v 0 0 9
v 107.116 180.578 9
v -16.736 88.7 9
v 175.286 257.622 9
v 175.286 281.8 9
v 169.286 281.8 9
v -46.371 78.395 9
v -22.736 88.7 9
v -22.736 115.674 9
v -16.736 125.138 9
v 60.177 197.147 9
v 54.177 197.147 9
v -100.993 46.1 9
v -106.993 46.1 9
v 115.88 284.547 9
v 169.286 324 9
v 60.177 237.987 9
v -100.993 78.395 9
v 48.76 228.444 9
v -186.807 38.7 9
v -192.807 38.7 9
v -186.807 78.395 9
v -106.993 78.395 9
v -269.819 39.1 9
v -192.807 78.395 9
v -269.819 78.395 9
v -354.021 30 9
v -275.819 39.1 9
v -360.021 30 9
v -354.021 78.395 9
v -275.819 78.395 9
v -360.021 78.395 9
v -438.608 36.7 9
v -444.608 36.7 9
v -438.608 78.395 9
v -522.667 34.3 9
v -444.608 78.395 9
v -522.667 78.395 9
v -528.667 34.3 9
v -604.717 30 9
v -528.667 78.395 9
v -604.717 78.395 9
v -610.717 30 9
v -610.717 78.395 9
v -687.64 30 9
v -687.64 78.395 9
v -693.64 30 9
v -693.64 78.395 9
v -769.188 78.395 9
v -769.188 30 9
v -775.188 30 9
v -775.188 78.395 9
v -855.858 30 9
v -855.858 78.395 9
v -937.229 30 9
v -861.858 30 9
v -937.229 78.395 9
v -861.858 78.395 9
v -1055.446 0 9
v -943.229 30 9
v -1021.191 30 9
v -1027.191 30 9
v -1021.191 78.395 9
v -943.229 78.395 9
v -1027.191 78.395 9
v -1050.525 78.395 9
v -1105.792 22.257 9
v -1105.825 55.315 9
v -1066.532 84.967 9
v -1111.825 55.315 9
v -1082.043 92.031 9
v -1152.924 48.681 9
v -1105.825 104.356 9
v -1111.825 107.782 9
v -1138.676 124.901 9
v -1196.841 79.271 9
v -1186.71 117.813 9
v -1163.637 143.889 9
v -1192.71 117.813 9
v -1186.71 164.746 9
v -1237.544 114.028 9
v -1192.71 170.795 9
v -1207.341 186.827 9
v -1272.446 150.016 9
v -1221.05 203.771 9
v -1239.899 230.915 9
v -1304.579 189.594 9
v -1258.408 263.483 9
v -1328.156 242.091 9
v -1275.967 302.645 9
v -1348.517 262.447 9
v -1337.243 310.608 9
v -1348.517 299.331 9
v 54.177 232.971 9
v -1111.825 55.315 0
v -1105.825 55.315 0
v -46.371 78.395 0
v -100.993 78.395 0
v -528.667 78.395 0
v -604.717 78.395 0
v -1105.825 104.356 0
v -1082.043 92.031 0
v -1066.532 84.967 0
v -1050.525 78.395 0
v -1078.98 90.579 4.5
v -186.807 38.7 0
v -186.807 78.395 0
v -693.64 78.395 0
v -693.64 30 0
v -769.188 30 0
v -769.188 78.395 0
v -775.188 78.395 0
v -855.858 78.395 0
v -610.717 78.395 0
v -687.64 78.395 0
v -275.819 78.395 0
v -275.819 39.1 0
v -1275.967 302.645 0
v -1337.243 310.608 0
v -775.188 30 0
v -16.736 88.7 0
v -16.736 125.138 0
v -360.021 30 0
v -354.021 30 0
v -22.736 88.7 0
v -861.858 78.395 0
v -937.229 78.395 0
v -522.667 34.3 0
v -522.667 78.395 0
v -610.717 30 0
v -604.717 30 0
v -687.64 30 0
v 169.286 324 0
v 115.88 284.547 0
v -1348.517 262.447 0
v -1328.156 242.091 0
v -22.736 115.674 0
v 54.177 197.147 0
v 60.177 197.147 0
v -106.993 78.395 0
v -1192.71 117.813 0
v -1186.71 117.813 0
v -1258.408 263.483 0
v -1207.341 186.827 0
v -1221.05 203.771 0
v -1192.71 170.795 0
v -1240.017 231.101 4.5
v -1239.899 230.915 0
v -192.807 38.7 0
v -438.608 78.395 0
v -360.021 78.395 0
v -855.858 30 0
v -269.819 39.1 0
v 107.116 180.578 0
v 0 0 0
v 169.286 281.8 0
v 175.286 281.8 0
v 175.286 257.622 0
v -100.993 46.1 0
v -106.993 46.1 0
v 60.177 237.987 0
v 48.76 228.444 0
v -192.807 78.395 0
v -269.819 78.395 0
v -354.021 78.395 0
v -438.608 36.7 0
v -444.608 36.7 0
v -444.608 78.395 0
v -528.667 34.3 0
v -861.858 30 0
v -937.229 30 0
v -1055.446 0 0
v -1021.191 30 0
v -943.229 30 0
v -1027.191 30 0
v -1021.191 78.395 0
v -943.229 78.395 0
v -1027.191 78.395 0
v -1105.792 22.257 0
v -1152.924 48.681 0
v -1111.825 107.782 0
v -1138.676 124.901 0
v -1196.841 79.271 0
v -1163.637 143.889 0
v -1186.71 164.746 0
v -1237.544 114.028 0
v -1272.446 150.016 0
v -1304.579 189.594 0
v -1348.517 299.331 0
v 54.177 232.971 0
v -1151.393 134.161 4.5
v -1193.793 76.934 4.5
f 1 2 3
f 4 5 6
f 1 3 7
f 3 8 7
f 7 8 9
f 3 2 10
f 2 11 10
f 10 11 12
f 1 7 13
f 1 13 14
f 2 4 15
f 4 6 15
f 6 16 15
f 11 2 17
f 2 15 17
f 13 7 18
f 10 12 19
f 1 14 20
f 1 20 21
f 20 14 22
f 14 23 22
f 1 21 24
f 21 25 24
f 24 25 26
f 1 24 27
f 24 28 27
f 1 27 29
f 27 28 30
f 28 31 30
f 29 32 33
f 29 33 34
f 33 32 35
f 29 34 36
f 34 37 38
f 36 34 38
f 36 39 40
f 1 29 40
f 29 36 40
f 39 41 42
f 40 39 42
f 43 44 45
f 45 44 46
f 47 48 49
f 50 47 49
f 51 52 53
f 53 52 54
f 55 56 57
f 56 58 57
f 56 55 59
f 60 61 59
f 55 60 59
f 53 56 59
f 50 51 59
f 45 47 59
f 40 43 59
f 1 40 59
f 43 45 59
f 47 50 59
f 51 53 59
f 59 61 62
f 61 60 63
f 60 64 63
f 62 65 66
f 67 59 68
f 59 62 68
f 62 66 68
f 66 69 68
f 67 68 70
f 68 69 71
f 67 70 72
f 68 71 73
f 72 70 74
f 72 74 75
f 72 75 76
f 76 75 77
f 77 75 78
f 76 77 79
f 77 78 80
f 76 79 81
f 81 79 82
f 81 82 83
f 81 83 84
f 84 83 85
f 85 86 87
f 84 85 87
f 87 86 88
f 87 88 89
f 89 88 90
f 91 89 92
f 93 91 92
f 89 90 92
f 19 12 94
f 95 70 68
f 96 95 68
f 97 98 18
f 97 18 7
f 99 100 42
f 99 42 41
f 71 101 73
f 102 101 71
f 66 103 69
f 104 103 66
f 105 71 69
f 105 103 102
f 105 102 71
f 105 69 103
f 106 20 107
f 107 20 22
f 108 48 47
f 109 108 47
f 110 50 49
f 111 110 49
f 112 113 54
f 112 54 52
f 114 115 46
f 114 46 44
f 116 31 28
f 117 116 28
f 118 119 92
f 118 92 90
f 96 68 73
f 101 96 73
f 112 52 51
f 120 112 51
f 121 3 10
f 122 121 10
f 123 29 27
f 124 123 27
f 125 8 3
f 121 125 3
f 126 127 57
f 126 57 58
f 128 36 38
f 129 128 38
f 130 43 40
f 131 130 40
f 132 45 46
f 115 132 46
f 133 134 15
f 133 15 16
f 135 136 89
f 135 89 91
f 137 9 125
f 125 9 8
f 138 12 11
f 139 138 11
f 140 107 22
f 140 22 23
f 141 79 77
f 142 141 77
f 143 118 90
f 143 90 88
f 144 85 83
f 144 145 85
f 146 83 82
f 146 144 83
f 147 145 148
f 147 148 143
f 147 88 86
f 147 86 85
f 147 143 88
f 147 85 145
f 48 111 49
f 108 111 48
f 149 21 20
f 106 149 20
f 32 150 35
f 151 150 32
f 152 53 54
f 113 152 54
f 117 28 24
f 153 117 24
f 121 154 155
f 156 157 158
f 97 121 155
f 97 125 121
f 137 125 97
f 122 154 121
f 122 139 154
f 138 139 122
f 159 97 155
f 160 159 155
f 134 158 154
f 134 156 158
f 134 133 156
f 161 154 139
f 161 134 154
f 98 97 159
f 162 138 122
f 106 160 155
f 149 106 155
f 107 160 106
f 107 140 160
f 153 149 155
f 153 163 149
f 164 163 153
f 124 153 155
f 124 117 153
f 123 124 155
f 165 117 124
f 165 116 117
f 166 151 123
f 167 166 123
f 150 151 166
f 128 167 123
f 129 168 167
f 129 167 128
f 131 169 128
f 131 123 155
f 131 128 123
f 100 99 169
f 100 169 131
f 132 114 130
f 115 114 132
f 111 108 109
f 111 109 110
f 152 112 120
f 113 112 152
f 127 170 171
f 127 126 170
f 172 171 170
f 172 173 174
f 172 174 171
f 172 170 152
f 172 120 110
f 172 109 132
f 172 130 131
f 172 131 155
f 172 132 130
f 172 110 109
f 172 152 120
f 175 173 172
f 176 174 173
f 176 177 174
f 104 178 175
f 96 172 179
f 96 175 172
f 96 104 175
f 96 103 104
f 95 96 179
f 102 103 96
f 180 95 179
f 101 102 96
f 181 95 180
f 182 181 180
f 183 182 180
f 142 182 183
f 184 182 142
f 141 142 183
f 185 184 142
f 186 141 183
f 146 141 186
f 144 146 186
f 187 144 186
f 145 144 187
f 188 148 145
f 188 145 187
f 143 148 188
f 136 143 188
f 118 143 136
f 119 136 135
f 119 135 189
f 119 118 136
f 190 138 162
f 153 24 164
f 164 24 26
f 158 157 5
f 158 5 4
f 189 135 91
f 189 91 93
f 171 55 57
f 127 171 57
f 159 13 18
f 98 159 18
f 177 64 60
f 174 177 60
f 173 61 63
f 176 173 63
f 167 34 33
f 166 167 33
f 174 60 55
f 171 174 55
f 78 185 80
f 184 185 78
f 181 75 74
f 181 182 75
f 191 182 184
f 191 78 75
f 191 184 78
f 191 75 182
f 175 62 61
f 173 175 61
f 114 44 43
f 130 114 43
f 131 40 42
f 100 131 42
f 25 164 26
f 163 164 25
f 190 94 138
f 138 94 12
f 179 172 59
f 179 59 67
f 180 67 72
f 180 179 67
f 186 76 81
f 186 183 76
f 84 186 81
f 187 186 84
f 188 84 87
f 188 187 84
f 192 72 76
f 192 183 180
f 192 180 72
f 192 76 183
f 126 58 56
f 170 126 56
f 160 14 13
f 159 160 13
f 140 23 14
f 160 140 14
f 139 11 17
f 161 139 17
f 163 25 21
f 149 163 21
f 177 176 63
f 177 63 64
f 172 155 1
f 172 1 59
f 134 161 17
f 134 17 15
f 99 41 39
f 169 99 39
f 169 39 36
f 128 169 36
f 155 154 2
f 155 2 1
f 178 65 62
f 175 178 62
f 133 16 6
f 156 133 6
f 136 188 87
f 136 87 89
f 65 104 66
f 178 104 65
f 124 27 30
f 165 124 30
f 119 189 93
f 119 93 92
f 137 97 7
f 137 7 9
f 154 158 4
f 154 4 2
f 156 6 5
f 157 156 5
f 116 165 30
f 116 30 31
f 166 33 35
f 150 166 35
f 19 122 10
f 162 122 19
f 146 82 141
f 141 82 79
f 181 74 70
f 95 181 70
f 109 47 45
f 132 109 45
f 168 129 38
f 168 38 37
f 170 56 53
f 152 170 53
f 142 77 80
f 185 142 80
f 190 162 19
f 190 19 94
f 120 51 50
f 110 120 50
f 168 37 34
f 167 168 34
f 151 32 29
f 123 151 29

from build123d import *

# Parameters (mm, degrees)
BOSS_EXTRU_2_DEPTH      = 9
ENL_V_MAT_EXTRU_2_DEPTH = 9
ENL_V_MAT_EXTRU_3_DEPTH = 10


with BuildPart() as part:
    # Esquisse2 → Boss.-Extru.2 (new body)
    with BuildSketch(Plane.XY):
        with BuildLine():
            Line((0, 0), (-1055.446290734, 0))
            add(Edge.make_bspline(
                [(-1055.446290734, 0), (-1207.572733387, 59.072106031), (-1304.579199027, 189.593529265)],
                knots=[0, 0, 0, 1, 1, 1], degree=2))
            Line((-1304.579199027, 189.593529265), (-1328.155601237, 242.090877604))
            Line((-1328.155601237, 242.090877604), (-1348.517039509, 262.446992266))
            Line((-1348.517039509, 262.446992266), (-1348.517039509, 299.331021292))
            Line((-1348.517039509, 299.331021292), (-1337.24264668, 310.608362644))
            Line((-1337.24264668, 310.608362644), (-1275.966827179, 302.644588826))
            add(Edge.make_bspline(
                [(-1275.966827179, 302.644588826), (-1212.760641583, 141.531535954), (-1050.525159664, 78.394553502)],
                knots=[0, 0, 0, 1, 1, 1], degree=2))
            Line((-1050.525159664, 78.394553502), (-46.371074076, 78.394553502))
            Line((-46.371074076, 78.394553502), (48.76008987, 228.44376205))
            Line((48.76008987, 228.44376205), (115.880348206, 284.547364773))
            Line((115.880348206, 284.547364773), (175.286334456, 328.432610938))
            Line((175.286334456, 328.432610938), (175.286334456, 257.621549377))
            Line((175.286334456, 257.621549377), (107.11594567, 180.577636332))
            Line((107.11594567, 180.577636332), (0, 0))
        make_face()
    extrude(amount=BOSS_EXTRU_2_DEPTH)

    # Esquisse4 → Enlèv. mat.-Extru.2 (cut)
    with BuildSketch(Plane.XY.offset(9)):
        Polygon((-1192.710056644, 217.724215408), (-1192.710056644, 117.812636738), (-1186.710056644, 117.812636738), (-1186.710056644, 209.090265158), (-1144.70133954, 205.492785887), (-1111.824911273, 179.590935136), (-1111.824911273, 55.314515649), (-1105.824911273, 55.314515649), (-1105.824911273, 174.913937406), (-1058.771084869, 188.659470271), (-1027.191161845, 161.497477767), (-1027.191161845, 30), (-1021.191161845, 30), (-1021.191161845, 167.225098507), (-976.159938867, 174.429619005), (-943.229008237, 161.127659365), (-943.229008237, 30), (-937.229008237, 30), (-937.229008237, 164.093815562), (-899.191490776, 172.001101596), (-861.857811784, 160.098627493), (-861.857811784, 30), (-855.857811784, 30), (-855.857811784, 196.236545153), (-815.986169177, 204.901610664), (-775.188433973, 184.176190605), (-775.188433973, 30), (-769.188433973, 30), (-769.188433973, 176.450577912), (-732.223715867, 183.004336583), (-693.639593808, 163.215620457), (-693.639593808, 30), (-687.639593808, 30), (-687.639593808, 172.485228345), (-653.152535866, 182.871939208), (-610.716601792, 161.453305285), (-610.716601792, 30), (-604.716601792, 30), (-604.716601792, 256.125318922), (-551.321272632, 268.910222611), (-528.666744333, 255.862211449), (-528.666744333, 34.3), (-522.666744333, 34.3), (-522.666744333, 255.102102604), (-476.392141731, 269.107524931), (-444.607914754, 258.656296952), (-444.607914754, 36.7), (-438.607914754, 36.7), (-438.607914754, 253.443093933), (-391.056155042, 266.894918017), (-360.02126631, 254.206439852), (-360.02126631, 30), (-354.02126631, 30), (-354.02126631, 250.104032237), (-303.804875297, 262.547483763), (-275.81856885, 247.243298089), (-275.81856885, 39.1), (-269.81856885, 39.1), (-269.81856885, 230.071554094), (-217.437093626, 257.378680484), (-192.806508582, 246.762372601), (-192.806508582, 38.7), (-186.806508582, 38.7), (-186.806508582, 245.622867868), (-134.999273909, 264.79720393), (-106.993498927, 255.334085011), (-106.993498927, 46.1), (-100.993498927, 46.1), (-100.993498927, 258.655280604), (-22.735685337, 264.839286488), (-22.735685337, 88.7), (-16.735685337, 88.7), (-16.735685337, 231.395876397), (-1.733463181, 266.202092714), (54.176868866, 313.052154508), (54.176868866, 197.147050424), (60.176868866, 197.147050424), (60.176868866, 330.337520125), (-1075.947973634, 334.662873451), align=None)
    extrude(amount=-ENL_V_MAT_EXTRU_2_DEPTH, mode=Mode.SUBTRACT)

    # Esquisse5 → Enlèv. mat.-Extru.3 (cut)
    with BuildSketch(Plane.XY.offset(9)):
        Polygon((169.286334456, 324.000204482), (169.286334456, 281.800204482), (175.286334456, 281.800204482), (202.680394495, 285.052171219), (208.588297758, 339.079823363), (181.275473189, 338.718158681), align=None)
    extrude(amount=-ENL_V_MAT_EXTRU_3_DEPTH, mode=Mode.SUBTRACT)


solid = part.part
